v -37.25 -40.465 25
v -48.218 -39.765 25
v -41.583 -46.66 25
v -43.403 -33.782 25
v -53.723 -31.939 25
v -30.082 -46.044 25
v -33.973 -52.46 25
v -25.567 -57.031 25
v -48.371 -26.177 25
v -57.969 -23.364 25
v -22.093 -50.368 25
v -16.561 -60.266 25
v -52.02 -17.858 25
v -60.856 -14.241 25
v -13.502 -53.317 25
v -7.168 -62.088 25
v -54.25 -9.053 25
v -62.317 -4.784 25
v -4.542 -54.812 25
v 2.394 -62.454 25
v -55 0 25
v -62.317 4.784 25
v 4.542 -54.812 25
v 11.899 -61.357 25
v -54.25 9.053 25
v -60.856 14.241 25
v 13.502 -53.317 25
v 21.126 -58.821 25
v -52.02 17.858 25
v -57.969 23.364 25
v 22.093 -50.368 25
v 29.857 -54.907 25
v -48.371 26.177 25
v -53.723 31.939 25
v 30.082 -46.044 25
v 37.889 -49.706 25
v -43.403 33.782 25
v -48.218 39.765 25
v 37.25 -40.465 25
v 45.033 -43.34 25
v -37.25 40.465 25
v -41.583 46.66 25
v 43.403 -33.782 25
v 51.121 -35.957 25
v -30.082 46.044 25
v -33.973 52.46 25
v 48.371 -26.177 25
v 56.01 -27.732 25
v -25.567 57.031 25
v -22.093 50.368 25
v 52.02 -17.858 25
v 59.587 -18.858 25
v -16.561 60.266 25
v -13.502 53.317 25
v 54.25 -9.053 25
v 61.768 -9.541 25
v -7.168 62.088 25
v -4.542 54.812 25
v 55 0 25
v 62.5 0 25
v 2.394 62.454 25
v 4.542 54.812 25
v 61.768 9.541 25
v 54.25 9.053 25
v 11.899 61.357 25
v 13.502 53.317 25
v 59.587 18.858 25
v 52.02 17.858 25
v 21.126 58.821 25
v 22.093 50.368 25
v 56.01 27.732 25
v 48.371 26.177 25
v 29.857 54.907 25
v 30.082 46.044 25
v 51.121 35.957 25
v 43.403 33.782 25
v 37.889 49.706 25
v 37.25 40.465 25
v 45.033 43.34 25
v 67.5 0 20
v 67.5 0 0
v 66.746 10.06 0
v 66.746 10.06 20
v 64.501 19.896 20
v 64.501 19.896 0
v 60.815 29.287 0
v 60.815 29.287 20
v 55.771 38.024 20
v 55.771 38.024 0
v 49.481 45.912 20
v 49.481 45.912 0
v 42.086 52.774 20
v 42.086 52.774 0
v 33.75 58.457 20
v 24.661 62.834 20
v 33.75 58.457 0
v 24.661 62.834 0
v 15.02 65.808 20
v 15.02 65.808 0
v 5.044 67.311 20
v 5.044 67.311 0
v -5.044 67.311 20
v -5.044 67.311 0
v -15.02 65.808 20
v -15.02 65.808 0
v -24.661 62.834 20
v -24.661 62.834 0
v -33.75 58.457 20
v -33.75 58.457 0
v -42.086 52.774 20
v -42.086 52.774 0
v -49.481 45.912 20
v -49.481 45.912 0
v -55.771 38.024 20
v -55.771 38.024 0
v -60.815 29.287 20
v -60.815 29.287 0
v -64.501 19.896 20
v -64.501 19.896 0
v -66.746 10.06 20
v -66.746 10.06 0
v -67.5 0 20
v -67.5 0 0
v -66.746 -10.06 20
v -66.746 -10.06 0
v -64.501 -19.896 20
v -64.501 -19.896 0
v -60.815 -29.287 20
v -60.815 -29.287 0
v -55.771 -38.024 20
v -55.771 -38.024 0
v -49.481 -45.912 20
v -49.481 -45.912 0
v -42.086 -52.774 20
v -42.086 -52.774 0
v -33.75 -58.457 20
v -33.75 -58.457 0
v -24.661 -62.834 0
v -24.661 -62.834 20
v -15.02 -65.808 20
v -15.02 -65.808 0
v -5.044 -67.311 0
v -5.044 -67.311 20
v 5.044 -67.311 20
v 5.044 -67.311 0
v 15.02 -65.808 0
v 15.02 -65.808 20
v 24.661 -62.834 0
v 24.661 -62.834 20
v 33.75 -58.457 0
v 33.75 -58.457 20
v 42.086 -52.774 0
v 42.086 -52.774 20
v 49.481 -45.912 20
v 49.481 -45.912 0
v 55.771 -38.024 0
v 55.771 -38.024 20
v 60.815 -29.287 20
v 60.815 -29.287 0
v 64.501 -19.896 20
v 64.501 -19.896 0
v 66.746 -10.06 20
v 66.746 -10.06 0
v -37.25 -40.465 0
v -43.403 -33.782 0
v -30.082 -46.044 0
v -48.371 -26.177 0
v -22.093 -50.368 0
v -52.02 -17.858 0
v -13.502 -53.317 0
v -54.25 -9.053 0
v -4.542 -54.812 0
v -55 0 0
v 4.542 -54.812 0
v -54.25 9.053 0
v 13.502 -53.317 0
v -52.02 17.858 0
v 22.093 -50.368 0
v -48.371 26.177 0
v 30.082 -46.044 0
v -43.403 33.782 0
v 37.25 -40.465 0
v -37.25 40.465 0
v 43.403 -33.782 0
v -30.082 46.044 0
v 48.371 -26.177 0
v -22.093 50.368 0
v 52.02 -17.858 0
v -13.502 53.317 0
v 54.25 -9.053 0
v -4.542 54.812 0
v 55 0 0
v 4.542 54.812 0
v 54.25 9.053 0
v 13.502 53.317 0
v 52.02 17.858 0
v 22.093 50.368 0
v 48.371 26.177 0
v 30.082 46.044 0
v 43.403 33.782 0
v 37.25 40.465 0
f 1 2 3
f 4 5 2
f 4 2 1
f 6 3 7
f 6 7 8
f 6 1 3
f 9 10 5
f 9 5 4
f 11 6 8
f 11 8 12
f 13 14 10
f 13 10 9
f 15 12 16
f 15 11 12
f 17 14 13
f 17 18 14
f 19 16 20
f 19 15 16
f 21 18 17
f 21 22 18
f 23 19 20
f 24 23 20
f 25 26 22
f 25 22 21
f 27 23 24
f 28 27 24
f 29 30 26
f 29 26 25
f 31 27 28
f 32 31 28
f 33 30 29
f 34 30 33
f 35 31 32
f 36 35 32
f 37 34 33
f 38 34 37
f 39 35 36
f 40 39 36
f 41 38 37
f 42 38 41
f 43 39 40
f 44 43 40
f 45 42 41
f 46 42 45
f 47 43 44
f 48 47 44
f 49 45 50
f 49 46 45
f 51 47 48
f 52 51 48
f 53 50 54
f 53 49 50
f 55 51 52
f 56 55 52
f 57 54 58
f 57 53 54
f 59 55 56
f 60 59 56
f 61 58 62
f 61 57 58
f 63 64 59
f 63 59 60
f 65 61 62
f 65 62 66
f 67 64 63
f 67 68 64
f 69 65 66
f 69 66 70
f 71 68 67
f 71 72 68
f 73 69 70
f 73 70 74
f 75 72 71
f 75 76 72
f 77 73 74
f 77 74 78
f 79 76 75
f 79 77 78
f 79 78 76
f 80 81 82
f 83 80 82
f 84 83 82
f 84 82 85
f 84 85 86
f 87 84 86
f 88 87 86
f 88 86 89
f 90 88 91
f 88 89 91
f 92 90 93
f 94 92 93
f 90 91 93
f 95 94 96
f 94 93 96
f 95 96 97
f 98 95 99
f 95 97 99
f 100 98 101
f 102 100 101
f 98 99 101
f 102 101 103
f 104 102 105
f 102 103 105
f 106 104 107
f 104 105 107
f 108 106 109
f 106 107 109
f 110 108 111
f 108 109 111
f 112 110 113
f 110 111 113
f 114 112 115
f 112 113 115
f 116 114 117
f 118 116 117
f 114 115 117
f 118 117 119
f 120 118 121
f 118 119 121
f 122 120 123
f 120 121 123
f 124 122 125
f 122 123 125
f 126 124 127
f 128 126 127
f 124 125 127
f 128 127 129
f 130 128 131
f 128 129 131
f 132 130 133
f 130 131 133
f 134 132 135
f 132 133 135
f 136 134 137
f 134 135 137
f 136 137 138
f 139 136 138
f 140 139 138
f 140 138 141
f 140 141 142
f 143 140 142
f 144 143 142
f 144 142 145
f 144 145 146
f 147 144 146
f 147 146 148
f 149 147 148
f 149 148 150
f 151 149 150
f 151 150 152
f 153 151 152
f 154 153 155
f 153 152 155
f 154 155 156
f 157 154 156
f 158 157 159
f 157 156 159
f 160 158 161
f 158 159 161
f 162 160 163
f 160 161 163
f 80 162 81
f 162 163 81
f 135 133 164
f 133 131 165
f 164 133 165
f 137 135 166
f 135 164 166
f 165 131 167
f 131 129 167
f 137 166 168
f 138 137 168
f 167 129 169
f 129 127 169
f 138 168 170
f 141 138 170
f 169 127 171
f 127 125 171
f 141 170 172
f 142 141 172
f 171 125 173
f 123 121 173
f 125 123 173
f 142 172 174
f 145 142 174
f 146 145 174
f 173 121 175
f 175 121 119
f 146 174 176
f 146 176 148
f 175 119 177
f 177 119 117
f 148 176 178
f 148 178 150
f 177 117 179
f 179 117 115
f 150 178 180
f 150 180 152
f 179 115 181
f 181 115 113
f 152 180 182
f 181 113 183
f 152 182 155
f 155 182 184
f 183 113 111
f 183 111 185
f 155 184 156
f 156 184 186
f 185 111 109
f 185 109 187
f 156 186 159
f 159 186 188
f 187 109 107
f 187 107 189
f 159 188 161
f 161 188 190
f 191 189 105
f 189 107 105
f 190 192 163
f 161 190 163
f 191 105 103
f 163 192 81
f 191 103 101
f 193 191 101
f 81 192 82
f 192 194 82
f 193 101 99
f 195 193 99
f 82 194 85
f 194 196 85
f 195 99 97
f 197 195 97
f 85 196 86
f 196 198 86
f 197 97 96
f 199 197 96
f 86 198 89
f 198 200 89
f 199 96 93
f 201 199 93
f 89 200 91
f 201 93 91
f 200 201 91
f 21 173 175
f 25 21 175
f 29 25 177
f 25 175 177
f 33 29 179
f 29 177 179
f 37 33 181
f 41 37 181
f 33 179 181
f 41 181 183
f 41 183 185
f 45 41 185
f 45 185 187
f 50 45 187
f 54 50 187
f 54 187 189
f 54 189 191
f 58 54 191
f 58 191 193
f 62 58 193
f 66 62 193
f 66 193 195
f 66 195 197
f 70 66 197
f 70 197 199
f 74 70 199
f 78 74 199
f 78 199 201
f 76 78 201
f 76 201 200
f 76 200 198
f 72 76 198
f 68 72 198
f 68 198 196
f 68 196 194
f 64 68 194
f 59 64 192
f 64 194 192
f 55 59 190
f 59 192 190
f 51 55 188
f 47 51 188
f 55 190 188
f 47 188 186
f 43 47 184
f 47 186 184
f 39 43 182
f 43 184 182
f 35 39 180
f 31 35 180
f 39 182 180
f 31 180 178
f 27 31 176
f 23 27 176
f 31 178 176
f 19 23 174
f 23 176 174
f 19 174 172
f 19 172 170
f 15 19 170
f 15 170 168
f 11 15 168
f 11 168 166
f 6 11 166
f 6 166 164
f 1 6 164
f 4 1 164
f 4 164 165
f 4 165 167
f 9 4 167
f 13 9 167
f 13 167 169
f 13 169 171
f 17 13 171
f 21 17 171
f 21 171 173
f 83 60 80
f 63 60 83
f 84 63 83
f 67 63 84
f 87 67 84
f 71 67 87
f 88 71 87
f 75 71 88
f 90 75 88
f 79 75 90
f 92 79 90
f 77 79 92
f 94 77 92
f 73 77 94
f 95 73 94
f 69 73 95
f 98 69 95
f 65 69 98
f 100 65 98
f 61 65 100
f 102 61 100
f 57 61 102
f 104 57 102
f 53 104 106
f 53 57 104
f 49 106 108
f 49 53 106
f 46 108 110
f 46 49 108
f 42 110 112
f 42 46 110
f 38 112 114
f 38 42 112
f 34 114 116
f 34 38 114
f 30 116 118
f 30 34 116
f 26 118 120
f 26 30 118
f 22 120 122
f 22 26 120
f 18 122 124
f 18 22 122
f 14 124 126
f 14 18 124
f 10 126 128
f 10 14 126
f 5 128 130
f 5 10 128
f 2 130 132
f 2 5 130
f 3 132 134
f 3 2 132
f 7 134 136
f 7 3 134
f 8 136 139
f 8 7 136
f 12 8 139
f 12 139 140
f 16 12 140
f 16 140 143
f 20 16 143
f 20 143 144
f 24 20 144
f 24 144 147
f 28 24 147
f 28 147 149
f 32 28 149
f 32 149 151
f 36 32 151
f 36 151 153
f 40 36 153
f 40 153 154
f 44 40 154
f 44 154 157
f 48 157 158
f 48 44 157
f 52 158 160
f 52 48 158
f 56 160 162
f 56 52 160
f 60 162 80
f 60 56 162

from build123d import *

# Parameters (mm, degrees)
SKETCH_1_R          = 67.5
EXTRUDE_1_DEPTH     = 25
CHAMFER_1_SIZE      = 5
SKETCH_2_R          = 55
CUT_EXTRUDE_1_DEPTH = 99.67877178


with BuildPart() as part:
    # Эскиз1 → Бобышка-Вытянуть1 (new body)
    with BuildSketch(Plane.XY):
        Circle(SKETCH_1_R)
    extrude(amount=EXTRUDE_1_DEPTH)

    # Фаска1
    chamfer_1_edges = [part.edges().sort_by_distance(p)[0] for p in [
        (-67.5, 0, 25),
    ]]
    chamfer(chamfer_1_edges, length=CHAMFER_1_SIZE)

    # Эскиз2 → Вырез-Вытянуть1 (cut, through all)
    with BuildSketch(Plane(origin=(0, 0, 0), x_dir=(-1, 0, 0), z_dir=(0, 0, -1))):
        Circle(SKETCH_2_R)
    extrude(amount=-CUT_EXTRUDE_1_DEPTH, mode=Mode.SUBTRACT)


solid = part.part
